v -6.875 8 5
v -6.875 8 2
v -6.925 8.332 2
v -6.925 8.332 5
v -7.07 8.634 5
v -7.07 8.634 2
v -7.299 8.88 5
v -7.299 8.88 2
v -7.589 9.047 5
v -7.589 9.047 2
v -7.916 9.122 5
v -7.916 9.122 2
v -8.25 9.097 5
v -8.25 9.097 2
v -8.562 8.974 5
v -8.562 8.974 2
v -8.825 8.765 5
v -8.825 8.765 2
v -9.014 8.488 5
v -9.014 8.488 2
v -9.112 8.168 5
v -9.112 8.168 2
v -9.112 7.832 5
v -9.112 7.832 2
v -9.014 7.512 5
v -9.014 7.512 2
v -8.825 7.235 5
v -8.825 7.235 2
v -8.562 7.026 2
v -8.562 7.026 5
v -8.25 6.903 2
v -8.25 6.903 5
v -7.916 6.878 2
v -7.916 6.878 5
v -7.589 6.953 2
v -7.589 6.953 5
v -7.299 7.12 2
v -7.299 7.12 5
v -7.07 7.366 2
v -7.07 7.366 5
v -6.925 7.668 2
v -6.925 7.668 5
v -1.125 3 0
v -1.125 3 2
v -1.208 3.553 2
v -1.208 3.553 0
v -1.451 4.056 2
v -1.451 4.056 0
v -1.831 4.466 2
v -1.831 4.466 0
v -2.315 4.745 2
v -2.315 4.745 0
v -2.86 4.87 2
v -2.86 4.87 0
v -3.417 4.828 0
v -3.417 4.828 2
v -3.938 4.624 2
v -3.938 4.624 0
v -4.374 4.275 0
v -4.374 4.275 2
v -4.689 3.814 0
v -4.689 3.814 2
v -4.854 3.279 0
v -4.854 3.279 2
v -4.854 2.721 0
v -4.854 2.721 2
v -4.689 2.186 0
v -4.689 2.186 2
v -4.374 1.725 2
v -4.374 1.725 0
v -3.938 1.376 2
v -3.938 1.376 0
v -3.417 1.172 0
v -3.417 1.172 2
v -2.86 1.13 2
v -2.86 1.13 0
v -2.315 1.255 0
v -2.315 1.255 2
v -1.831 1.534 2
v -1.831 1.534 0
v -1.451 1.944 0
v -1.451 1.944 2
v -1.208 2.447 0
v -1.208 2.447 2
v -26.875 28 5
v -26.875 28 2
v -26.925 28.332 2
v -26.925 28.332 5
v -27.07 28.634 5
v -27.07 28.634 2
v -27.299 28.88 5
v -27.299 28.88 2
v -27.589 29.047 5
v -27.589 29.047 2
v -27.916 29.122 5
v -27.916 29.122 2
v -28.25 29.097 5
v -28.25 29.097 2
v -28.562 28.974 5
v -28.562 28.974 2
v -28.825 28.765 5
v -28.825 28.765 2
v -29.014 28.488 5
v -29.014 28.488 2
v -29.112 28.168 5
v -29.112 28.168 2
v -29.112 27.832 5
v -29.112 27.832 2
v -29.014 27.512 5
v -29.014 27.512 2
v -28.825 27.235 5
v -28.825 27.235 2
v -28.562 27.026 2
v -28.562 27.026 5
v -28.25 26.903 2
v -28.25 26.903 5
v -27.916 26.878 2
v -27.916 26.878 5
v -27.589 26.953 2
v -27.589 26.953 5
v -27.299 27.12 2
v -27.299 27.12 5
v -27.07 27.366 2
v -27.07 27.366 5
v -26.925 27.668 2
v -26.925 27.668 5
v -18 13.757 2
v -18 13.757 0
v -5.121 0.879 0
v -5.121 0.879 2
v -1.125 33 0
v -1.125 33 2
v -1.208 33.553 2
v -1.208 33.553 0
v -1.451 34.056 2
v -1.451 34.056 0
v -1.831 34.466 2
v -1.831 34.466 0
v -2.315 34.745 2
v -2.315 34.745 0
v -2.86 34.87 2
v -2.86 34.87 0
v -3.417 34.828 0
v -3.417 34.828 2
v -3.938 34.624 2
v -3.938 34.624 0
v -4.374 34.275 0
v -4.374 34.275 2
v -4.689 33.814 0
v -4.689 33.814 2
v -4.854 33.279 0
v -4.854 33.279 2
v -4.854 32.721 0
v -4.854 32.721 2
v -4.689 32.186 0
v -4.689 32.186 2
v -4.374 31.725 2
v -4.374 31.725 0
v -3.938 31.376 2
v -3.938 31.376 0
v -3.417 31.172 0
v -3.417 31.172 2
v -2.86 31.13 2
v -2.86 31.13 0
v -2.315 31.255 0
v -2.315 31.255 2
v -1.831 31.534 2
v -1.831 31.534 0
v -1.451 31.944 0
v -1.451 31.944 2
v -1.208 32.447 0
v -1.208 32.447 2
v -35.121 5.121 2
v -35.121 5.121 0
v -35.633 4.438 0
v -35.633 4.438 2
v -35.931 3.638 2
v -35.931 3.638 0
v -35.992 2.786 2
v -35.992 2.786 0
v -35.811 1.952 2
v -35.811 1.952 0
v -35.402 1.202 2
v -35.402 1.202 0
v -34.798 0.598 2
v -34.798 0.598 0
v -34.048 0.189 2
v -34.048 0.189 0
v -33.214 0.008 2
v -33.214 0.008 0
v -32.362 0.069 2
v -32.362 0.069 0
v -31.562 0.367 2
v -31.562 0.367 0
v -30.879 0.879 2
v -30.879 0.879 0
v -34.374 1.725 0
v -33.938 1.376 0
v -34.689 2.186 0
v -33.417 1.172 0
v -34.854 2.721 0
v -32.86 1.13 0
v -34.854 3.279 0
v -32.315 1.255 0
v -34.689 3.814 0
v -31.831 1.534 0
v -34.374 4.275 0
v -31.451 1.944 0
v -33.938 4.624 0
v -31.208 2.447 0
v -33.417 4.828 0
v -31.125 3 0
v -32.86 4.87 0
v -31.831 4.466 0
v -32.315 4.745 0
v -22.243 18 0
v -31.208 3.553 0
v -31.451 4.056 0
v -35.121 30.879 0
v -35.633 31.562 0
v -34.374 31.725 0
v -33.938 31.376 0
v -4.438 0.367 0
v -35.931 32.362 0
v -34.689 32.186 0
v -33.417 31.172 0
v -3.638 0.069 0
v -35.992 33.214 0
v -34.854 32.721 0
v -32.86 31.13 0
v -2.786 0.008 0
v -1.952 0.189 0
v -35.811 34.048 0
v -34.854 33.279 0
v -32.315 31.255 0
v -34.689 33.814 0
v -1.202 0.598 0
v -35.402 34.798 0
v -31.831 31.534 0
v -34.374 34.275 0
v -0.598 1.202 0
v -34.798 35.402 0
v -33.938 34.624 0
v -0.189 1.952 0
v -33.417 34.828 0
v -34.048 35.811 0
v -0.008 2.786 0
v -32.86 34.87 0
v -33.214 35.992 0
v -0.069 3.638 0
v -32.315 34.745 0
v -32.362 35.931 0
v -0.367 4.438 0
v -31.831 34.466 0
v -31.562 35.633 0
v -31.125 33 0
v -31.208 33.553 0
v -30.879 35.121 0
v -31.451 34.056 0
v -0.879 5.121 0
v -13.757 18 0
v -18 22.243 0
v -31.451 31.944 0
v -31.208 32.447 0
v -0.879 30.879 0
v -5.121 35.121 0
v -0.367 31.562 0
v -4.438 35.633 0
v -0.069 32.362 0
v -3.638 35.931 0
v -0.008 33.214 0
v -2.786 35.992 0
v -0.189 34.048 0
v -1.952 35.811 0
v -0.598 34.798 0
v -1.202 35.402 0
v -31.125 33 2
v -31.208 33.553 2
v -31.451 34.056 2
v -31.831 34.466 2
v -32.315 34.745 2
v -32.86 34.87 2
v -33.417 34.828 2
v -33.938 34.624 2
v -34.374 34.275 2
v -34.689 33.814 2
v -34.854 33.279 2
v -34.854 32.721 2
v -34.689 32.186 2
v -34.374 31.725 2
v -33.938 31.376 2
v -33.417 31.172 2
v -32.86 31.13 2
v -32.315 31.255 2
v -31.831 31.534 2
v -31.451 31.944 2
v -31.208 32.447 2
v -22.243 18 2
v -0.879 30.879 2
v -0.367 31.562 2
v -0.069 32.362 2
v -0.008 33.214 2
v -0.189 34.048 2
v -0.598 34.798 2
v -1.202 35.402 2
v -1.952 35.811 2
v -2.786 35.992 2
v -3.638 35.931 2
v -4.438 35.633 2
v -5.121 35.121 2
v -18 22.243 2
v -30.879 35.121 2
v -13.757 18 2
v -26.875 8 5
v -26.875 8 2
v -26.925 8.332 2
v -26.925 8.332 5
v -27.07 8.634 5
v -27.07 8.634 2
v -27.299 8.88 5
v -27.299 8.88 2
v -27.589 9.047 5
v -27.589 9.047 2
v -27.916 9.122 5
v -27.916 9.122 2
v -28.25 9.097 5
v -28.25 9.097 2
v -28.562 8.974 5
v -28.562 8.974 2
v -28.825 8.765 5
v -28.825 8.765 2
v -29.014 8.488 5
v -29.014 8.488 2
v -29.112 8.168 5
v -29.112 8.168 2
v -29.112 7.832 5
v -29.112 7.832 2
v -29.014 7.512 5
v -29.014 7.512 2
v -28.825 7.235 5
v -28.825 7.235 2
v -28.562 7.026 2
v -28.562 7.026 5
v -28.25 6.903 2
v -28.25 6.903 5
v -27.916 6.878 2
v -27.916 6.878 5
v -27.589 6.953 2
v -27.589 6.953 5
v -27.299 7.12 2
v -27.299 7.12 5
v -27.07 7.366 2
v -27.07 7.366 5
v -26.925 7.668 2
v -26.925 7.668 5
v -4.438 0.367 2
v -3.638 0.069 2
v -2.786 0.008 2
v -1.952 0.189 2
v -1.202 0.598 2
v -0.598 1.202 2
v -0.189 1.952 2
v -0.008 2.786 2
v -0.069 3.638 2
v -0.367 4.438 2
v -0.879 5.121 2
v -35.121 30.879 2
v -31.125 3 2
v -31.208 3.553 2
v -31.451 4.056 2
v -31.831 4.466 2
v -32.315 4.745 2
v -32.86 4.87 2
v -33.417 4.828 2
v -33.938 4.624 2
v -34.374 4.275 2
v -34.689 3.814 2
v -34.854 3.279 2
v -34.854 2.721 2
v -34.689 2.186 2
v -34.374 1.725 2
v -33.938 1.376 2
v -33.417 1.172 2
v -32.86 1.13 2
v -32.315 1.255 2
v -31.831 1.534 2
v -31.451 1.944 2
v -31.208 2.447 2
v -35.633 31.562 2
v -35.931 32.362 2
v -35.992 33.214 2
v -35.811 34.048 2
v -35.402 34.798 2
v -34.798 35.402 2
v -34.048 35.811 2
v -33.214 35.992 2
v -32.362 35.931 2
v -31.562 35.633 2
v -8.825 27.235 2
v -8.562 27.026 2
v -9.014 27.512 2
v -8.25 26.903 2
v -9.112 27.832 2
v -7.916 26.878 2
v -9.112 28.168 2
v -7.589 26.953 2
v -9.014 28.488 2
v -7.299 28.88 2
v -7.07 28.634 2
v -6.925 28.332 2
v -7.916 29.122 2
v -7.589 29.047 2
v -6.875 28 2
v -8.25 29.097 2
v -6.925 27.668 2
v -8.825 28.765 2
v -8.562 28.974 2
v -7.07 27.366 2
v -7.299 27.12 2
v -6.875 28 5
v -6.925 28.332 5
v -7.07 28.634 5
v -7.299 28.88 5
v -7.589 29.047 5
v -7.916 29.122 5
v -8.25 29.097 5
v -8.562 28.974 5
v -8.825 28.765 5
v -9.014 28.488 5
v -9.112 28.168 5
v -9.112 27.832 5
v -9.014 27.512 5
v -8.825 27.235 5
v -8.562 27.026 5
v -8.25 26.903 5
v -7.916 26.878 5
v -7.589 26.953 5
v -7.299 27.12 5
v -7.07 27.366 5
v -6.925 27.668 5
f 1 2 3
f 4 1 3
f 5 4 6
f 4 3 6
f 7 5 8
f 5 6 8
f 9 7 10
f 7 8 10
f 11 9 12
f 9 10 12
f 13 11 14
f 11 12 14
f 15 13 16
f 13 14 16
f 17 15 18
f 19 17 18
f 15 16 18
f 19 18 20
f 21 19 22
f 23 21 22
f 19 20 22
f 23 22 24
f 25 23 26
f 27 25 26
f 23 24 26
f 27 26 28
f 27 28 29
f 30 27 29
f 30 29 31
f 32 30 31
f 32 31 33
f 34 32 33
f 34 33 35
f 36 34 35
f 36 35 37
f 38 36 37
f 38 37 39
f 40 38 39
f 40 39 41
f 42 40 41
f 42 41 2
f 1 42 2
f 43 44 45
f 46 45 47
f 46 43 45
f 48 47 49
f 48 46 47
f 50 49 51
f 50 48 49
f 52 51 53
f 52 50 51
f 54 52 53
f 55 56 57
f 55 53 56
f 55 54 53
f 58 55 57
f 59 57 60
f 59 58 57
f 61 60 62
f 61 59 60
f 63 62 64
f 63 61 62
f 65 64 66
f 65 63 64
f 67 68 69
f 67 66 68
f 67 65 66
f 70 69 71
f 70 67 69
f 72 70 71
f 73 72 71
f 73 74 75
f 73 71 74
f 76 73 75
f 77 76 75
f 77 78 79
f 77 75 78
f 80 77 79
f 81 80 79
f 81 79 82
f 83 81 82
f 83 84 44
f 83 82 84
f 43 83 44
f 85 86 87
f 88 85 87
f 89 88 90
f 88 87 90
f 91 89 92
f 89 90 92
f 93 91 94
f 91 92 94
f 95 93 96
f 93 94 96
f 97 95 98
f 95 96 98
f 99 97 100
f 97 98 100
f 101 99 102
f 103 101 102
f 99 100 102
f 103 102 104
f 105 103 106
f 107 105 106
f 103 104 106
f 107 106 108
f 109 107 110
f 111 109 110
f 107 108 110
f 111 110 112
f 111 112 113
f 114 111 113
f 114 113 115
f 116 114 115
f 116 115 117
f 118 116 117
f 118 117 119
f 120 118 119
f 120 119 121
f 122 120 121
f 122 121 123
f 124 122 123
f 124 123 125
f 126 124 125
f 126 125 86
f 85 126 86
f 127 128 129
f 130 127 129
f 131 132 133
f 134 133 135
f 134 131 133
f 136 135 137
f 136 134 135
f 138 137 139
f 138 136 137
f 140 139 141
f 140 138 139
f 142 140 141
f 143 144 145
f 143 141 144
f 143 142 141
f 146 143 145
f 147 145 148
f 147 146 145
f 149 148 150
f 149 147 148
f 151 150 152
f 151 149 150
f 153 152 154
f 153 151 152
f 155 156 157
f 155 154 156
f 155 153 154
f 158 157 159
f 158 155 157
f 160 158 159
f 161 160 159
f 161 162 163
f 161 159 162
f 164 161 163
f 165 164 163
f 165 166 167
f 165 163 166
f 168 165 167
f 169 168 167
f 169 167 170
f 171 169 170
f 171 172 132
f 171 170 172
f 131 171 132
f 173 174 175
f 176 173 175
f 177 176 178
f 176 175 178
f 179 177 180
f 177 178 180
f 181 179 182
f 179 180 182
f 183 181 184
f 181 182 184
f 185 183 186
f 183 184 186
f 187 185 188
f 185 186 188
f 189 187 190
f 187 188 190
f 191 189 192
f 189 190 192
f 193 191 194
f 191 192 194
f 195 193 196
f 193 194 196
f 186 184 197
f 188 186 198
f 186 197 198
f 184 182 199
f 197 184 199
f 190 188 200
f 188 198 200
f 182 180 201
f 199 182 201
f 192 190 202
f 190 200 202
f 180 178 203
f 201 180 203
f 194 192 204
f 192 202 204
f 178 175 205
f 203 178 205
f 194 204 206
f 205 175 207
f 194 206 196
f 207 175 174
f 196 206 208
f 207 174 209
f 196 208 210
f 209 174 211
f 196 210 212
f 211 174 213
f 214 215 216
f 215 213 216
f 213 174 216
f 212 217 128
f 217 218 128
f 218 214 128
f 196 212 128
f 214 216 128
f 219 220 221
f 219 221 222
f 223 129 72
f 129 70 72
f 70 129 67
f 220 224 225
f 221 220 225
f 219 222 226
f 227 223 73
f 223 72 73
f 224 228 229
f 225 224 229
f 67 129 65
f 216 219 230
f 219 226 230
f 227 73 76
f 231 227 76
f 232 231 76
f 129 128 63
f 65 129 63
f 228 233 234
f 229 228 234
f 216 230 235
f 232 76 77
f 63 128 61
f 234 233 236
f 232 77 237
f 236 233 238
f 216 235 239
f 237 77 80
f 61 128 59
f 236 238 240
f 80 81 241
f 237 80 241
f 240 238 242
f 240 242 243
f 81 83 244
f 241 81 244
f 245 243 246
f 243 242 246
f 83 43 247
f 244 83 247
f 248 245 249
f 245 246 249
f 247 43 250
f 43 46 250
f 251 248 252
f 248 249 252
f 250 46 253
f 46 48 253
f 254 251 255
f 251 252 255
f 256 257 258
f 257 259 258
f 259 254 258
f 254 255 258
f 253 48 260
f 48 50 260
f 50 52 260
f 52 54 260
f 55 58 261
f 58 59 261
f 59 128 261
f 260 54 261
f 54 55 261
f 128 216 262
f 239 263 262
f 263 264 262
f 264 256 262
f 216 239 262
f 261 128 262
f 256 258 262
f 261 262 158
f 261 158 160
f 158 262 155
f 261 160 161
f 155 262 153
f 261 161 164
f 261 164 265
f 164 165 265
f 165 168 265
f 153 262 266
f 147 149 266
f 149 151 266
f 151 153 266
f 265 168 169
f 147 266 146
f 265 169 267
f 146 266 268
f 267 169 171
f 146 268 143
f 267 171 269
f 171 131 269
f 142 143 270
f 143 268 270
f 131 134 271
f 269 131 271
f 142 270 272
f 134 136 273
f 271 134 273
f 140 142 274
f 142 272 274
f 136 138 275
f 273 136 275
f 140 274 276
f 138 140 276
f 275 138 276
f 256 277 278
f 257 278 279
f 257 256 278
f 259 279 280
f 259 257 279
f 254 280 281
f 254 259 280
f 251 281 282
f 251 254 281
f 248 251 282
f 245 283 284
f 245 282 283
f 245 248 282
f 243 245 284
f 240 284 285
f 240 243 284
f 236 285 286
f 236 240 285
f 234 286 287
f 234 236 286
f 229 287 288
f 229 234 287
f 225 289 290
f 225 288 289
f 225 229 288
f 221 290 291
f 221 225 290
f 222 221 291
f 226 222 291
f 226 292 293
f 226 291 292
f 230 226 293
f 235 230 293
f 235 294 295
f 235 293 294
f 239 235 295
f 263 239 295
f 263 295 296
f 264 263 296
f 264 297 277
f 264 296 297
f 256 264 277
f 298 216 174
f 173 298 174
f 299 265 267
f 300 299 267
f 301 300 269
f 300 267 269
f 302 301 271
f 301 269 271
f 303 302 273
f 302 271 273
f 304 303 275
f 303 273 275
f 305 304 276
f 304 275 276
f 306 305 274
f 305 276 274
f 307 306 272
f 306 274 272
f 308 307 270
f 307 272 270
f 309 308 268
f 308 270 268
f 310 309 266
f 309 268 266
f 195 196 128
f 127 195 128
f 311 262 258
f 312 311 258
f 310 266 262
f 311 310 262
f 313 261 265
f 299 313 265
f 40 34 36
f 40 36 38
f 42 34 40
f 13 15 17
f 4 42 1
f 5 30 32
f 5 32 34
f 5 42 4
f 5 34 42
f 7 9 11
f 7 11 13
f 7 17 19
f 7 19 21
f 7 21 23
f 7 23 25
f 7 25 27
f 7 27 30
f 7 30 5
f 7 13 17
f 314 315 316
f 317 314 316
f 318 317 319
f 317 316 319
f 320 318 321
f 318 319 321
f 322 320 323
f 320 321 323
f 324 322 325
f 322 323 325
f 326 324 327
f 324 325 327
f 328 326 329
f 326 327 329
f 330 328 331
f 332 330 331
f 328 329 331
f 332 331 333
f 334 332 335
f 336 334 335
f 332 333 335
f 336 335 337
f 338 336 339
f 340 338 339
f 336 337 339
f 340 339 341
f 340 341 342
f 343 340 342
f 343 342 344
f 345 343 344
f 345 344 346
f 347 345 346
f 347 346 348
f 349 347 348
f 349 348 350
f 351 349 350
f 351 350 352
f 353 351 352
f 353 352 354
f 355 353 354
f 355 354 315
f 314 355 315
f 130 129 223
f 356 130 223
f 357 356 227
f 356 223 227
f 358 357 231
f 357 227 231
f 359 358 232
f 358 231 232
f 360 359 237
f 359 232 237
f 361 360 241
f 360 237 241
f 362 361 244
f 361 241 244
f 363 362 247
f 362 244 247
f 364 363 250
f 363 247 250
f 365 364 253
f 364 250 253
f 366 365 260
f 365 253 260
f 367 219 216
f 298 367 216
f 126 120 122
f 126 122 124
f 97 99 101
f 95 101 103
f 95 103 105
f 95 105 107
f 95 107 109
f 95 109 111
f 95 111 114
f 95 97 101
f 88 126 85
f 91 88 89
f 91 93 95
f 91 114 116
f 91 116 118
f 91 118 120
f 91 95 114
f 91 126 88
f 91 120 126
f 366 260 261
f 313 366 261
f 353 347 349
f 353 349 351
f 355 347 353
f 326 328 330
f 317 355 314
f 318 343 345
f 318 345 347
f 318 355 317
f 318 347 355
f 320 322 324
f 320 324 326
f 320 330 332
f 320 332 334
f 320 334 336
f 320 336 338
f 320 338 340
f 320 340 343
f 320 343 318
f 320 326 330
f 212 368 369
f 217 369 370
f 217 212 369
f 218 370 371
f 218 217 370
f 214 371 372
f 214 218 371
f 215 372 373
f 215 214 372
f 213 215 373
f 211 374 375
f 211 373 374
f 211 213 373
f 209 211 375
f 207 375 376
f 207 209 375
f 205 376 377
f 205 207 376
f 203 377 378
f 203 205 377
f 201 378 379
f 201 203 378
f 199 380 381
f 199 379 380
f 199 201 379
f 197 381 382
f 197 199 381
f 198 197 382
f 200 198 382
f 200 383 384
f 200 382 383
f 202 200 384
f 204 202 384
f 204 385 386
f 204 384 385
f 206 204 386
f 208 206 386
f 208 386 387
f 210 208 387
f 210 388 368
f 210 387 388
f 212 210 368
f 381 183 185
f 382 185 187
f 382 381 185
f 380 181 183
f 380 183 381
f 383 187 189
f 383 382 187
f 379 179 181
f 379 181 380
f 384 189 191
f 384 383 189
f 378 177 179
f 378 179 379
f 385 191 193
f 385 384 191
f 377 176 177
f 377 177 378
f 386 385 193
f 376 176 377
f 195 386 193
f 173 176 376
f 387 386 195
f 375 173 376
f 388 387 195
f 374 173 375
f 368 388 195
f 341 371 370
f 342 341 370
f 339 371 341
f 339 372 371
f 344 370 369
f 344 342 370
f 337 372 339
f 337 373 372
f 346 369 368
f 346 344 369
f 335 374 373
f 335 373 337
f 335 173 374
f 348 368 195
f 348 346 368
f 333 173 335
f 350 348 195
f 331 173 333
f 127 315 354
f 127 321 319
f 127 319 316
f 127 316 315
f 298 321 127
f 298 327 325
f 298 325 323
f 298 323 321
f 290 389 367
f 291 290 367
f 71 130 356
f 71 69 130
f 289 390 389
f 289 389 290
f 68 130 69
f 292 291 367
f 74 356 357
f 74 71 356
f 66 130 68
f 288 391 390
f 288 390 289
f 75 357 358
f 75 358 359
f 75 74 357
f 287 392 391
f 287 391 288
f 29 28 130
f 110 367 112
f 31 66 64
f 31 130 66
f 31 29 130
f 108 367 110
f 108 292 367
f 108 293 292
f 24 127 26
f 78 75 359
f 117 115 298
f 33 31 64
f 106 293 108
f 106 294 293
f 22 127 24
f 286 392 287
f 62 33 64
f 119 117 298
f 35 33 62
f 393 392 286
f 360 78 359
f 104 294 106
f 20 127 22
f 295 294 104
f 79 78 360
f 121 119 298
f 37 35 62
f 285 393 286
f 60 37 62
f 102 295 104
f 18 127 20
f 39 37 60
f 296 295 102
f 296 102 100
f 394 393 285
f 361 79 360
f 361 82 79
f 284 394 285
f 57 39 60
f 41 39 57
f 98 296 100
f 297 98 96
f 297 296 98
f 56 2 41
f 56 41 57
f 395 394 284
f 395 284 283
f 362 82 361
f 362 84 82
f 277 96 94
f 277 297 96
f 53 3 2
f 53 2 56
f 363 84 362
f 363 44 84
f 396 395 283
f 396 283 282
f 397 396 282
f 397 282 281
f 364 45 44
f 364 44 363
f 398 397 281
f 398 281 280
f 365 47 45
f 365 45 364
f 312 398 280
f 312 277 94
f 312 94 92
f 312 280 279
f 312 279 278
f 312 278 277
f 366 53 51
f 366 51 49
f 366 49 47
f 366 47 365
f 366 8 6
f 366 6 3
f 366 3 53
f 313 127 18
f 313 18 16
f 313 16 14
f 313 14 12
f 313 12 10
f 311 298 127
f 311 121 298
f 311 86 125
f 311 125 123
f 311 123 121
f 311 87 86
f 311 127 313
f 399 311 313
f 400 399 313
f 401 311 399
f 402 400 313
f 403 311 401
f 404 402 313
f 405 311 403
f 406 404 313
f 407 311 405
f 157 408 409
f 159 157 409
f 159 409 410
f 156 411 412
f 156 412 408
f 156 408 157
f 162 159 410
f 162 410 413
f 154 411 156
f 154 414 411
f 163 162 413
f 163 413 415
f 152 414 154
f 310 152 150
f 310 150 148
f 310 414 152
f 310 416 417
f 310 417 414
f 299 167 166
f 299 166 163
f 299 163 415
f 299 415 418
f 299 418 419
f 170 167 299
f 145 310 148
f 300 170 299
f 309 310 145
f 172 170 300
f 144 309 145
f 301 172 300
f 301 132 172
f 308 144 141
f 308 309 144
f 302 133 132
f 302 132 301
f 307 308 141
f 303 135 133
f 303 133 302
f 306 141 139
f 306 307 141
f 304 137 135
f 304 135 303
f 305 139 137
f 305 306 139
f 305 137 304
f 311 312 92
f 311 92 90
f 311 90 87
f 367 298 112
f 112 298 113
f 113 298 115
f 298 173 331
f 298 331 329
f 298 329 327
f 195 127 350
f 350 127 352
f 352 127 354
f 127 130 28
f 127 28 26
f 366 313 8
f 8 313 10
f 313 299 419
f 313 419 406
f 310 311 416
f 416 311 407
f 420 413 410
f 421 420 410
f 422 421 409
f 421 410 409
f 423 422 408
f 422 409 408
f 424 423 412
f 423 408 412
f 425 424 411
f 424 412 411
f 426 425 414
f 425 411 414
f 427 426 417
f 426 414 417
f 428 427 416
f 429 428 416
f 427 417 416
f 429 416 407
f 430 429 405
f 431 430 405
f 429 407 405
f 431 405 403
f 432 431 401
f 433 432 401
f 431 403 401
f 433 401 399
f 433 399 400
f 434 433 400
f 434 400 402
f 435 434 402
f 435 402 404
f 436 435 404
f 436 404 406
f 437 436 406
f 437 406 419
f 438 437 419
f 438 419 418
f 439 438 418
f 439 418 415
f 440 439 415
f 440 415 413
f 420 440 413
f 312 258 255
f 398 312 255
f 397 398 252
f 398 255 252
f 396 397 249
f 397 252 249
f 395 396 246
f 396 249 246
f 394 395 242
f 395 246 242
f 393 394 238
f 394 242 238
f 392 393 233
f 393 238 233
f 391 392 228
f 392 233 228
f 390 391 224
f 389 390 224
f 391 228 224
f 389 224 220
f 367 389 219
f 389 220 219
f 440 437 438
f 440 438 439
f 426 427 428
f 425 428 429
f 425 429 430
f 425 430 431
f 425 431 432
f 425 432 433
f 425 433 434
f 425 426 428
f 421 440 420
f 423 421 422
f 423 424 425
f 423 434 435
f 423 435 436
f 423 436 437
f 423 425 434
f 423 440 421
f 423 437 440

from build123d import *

# Parameters (mm, degrees)
F5_DEPTH = 2
F3_R     = 1.875
F6_DEPTH = 10
F4_R     = 1.125
F7_DEPTH = 5


with BuildPart() as f5:
    # F2 (on Top) → F5 (new body)
    with BuildSketch(Plane.XY):
        with BuildLine():
            Line((-18, 22.242641), (-30.87868, 35.12132))
            ThreePointArc((-30.87868, 35.12132), (-35.12132, 35.12132), (-35.12132, 30.87868))
            Line((-35.12132, 30.87868), (-22.242641, 18))
            Line((-22.242641, 18), (-35.12132, 5.12132))
            ThreePointArc((-35.12132, 5.12132), (-35.12132, 0.87868), (-30.87868, 0.87868))
            Line((-30.87868, 0.87868), (-18, 13.757359))
            Line((-18, 13.757359), (-5.12132, 0.87868))
            ThreePointArc((-5.12132, 0.87868), (-0.87868, 0.87868), (-0.87868, 5.12132))
            Line((-0.87868, 5.12132), (-13.757359, 18))
            Line((-13.757359, 18), (-0.87868, 30.87868))
            ThreePointArc((-0.87868, 30.87868), (-0.87868, 35.12132), (-5.12132, 35.12132))
            Line((-5.12132, 35.12132), (-18, 22.242641))
        make_face()
    extrude(amount=F5_DEPTH)

    # F3 (on Top) → F6 (cut)
    with BuildSketch(Plane.XY):
        with Locations((-33, 33)):
            Circle(F3_R)
        with Locations((-3, 33)):
            Circle(F3_R)
        with Locations((-3, 3)):
            Circle(F3_R)
        with Locations((-33, 3)):
            Circle(F3_R)
    extrude(amount=F6_DEPTH, mode=Mode.SUBTRACT)

    # F4 (on Top) → F7 (join)
    with BuildSketch(Plane.XY):
        with Locations((-28, 8)):
            Circle(F4_R)
        with Locations((-8, 8)):
            Circle(F4_R)
        with Locations((-8, 28)):
            Circle(F4_R)
        with Locations((-28, 28)):
            Circle(F4_R)
    extrude(amount=F7_DEPTH)


solid = f5.part
